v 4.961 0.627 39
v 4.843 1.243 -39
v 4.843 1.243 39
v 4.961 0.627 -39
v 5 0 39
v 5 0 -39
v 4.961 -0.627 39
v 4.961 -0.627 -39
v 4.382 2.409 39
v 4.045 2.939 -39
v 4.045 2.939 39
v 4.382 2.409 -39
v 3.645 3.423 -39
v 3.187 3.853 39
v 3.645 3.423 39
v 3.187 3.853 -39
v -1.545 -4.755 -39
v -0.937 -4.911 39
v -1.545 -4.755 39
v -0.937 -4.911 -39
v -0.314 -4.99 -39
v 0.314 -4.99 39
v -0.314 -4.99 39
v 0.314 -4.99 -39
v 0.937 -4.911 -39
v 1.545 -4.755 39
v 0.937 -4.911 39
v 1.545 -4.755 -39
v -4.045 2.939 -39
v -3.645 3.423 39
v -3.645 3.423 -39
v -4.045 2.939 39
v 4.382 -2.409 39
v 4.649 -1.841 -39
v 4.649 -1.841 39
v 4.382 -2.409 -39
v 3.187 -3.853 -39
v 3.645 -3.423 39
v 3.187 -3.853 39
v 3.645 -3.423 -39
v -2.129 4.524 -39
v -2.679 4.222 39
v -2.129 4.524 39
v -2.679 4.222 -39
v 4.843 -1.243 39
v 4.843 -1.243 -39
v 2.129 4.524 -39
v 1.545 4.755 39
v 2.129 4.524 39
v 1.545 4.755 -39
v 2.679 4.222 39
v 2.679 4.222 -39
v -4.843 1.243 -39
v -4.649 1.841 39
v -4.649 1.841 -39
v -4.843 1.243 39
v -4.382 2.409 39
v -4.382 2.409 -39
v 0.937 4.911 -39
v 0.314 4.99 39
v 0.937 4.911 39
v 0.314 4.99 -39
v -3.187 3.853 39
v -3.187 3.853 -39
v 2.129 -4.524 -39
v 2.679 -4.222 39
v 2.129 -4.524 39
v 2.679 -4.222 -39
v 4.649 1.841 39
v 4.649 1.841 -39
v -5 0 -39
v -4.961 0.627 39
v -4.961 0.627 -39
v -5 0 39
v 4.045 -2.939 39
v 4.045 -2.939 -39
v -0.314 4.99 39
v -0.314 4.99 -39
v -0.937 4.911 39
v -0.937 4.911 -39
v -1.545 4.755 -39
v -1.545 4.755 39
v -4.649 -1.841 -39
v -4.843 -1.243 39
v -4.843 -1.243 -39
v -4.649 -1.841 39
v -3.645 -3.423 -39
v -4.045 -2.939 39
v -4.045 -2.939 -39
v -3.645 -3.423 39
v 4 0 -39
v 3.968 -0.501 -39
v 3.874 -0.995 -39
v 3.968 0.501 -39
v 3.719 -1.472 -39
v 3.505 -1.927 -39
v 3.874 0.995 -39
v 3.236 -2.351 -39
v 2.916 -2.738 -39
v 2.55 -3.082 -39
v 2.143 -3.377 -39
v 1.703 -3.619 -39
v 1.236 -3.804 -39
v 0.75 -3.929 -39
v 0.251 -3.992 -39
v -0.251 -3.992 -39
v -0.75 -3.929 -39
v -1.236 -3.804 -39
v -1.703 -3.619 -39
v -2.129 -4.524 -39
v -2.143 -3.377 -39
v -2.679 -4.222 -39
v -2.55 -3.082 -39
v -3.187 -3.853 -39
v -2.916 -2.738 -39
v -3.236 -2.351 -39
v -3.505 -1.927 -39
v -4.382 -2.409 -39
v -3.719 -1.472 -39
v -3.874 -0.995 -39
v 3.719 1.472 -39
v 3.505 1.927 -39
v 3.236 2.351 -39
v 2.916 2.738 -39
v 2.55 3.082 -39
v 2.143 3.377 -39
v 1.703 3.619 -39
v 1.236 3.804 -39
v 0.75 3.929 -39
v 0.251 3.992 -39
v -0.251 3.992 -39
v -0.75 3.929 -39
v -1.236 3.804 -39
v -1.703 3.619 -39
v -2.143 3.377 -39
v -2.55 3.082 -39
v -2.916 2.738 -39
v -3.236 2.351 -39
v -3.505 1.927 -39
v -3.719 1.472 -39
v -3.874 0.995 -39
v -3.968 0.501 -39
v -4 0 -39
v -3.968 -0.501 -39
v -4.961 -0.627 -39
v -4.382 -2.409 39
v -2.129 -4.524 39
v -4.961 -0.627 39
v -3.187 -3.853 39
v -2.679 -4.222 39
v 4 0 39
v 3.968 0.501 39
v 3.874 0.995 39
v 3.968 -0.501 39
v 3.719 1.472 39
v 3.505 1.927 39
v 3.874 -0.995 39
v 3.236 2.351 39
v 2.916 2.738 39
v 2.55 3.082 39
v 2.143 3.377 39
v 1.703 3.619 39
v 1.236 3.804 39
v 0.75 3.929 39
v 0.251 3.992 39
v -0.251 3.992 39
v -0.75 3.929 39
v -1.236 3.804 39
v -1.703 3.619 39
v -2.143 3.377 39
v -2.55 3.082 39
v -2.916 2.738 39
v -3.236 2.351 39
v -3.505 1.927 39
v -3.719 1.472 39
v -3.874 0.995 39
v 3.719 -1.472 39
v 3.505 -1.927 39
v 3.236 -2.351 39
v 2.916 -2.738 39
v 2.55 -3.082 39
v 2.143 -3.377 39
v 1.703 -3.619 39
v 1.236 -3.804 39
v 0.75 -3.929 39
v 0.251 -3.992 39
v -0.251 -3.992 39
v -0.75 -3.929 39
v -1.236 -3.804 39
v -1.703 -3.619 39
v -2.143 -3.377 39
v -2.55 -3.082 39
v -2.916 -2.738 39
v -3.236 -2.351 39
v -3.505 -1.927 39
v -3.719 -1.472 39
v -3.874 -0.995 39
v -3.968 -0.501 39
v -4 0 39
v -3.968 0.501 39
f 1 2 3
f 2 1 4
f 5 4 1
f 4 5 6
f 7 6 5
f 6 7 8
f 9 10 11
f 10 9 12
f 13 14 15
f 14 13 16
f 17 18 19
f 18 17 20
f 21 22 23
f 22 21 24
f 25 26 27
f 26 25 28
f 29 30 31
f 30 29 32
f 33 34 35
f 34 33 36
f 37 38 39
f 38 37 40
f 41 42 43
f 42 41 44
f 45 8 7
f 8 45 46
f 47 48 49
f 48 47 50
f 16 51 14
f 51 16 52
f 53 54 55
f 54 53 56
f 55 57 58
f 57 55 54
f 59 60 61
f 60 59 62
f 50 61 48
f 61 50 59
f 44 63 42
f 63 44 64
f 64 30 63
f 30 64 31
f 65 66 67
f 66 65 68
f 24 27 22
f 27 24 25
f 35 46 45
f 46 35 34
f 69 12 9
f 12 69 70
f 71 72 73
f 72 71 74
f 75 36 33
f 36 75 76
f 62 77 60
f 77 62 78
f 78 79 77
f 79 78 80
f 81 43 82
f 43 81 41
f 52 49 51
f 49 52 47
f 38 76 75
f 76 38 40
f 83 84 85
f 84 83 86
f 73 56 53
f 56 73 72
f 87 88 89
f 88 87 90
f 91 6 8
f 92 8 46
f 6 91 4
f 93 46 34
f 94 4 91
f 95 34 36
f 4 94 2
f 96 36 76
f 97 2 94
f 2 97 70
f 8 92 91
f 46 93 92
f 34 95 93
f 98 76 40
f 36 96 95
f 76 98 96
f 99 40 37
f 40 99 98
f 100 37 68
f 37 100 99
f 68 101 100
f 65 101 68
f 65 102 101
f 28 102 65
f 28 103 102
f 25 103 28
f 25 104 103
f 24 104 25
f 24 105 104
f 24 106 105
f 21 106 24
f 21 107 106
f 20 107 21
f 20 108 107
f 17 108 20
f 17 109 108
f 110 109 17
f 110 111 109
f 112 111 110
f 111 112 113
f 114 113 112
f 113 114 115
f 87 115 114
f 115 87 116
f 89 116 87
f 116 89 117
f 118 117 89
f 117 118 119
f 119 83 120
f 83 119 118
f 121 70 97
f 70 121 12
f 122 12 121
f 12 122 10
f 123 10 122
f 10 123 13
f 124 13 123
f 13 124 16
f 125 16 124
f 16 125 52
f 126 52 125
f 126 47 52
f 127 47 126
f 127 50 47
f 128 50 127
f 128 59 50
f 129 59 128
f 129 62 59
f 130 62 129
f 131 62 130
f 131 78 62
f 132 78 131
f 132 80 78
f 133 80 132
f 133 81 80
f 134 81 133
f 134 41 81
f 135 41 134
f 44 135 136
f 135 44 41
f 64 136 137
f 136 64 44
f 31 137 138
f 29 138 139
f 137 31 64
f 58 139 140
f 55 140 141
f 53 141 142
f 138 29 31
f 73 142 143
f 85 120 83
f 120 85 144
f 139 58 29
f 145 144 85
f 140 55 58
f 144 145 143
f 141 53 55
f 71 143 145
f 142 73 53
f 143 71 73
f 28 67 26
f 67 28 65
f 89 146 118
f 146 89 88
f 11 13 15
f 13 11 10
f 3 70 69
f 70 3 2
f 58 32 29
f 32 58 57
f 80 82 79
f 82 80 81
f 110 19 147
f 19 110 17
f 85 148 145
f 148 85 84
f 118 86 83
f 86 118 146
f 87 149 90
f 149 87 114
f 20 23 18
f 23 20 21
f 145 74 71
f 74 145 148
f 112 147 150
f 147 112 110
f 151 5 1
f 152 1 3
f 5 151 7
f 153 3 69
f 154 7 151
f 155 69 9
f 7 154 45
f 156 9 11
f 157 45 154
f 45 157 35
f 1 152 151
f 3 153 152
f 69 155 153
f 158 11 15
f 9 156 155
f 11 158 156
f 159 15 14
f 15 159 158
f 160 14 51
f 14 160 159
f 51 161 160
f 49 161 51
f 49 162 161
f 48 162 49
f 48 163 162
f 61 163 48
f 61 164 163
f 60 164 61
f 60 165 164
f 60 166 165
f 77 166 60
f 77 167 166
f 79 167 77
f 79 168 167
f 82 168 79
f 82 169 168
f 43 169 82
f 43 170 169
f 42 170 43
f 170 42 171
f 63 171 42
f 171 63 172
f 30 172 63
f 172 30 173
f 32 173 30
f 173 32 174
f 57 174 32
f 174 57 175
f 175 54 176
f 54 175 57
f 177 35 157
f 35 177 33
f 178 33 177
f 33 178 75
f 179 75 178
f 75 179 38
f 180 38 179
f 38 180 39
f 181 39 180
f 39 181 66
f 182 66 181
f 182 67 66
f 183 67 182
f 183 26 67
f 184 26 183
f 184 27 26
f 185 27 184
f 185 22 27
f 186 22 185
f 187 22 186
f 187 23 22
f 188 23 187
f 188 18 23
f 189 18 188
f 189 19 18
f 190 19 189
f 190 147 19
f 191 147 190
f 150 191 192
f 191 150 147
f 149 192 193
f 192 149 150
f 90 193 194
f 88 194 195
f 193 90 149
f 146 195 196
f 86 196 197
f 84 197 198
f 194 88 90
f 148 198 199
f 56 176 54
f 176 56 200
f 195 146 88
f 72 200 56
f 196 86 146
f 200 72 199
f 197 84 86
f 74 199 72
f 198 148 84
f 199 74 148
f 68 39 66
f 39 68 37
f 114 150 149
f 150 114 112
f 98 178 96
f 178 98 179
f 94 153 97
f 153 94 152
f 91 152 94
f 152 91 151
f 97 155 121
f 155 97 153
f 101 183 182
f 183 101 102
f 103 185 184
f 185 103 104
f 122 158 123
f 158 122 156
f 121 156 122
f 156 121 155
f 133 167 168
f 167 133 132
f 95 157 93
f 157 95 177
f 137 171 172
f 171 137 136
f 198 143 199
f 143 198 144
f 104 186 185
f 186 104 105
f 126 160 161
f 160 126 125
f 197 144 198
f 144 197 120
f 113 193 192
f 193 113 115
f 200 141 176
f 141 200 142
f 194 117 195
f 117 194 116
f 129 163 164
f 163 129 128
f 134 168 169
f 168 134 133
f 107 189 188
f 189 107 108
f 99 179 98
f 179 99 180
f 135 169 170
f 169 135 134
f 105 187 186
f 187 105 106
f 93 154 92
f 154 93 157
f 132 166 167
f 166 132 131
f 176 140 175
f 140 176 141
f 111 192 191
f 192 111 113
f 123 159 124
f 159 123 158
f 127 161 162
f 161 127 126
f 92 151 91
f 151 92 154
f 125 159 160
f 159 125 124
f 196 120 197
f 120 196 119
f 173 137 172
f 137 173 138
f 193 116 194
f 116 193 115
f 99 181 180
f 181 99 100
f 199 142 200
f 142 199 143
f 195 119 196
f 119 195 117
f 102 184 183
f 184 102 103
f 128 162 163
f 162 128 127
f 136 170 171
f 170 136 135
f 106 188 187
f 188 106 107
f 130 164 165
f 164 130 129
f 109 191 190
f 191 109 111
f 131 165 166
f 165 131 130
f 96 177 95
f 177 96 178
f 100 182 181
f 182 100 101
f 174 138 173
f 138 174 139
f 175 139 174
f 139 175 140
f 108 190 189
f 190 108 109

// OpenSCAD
$fn = 50;


difference() {
	union() {
		translate(v = [0, 0, -39.0000000000]) {
			cylinder(h = 78, r = 5.0000000000);
		}
	}
	union() {
		translate(v = [0, 0, -100.0000000000]) {
			cylinder(h = 200, r = 4.0000000000);
		}
	}
}
